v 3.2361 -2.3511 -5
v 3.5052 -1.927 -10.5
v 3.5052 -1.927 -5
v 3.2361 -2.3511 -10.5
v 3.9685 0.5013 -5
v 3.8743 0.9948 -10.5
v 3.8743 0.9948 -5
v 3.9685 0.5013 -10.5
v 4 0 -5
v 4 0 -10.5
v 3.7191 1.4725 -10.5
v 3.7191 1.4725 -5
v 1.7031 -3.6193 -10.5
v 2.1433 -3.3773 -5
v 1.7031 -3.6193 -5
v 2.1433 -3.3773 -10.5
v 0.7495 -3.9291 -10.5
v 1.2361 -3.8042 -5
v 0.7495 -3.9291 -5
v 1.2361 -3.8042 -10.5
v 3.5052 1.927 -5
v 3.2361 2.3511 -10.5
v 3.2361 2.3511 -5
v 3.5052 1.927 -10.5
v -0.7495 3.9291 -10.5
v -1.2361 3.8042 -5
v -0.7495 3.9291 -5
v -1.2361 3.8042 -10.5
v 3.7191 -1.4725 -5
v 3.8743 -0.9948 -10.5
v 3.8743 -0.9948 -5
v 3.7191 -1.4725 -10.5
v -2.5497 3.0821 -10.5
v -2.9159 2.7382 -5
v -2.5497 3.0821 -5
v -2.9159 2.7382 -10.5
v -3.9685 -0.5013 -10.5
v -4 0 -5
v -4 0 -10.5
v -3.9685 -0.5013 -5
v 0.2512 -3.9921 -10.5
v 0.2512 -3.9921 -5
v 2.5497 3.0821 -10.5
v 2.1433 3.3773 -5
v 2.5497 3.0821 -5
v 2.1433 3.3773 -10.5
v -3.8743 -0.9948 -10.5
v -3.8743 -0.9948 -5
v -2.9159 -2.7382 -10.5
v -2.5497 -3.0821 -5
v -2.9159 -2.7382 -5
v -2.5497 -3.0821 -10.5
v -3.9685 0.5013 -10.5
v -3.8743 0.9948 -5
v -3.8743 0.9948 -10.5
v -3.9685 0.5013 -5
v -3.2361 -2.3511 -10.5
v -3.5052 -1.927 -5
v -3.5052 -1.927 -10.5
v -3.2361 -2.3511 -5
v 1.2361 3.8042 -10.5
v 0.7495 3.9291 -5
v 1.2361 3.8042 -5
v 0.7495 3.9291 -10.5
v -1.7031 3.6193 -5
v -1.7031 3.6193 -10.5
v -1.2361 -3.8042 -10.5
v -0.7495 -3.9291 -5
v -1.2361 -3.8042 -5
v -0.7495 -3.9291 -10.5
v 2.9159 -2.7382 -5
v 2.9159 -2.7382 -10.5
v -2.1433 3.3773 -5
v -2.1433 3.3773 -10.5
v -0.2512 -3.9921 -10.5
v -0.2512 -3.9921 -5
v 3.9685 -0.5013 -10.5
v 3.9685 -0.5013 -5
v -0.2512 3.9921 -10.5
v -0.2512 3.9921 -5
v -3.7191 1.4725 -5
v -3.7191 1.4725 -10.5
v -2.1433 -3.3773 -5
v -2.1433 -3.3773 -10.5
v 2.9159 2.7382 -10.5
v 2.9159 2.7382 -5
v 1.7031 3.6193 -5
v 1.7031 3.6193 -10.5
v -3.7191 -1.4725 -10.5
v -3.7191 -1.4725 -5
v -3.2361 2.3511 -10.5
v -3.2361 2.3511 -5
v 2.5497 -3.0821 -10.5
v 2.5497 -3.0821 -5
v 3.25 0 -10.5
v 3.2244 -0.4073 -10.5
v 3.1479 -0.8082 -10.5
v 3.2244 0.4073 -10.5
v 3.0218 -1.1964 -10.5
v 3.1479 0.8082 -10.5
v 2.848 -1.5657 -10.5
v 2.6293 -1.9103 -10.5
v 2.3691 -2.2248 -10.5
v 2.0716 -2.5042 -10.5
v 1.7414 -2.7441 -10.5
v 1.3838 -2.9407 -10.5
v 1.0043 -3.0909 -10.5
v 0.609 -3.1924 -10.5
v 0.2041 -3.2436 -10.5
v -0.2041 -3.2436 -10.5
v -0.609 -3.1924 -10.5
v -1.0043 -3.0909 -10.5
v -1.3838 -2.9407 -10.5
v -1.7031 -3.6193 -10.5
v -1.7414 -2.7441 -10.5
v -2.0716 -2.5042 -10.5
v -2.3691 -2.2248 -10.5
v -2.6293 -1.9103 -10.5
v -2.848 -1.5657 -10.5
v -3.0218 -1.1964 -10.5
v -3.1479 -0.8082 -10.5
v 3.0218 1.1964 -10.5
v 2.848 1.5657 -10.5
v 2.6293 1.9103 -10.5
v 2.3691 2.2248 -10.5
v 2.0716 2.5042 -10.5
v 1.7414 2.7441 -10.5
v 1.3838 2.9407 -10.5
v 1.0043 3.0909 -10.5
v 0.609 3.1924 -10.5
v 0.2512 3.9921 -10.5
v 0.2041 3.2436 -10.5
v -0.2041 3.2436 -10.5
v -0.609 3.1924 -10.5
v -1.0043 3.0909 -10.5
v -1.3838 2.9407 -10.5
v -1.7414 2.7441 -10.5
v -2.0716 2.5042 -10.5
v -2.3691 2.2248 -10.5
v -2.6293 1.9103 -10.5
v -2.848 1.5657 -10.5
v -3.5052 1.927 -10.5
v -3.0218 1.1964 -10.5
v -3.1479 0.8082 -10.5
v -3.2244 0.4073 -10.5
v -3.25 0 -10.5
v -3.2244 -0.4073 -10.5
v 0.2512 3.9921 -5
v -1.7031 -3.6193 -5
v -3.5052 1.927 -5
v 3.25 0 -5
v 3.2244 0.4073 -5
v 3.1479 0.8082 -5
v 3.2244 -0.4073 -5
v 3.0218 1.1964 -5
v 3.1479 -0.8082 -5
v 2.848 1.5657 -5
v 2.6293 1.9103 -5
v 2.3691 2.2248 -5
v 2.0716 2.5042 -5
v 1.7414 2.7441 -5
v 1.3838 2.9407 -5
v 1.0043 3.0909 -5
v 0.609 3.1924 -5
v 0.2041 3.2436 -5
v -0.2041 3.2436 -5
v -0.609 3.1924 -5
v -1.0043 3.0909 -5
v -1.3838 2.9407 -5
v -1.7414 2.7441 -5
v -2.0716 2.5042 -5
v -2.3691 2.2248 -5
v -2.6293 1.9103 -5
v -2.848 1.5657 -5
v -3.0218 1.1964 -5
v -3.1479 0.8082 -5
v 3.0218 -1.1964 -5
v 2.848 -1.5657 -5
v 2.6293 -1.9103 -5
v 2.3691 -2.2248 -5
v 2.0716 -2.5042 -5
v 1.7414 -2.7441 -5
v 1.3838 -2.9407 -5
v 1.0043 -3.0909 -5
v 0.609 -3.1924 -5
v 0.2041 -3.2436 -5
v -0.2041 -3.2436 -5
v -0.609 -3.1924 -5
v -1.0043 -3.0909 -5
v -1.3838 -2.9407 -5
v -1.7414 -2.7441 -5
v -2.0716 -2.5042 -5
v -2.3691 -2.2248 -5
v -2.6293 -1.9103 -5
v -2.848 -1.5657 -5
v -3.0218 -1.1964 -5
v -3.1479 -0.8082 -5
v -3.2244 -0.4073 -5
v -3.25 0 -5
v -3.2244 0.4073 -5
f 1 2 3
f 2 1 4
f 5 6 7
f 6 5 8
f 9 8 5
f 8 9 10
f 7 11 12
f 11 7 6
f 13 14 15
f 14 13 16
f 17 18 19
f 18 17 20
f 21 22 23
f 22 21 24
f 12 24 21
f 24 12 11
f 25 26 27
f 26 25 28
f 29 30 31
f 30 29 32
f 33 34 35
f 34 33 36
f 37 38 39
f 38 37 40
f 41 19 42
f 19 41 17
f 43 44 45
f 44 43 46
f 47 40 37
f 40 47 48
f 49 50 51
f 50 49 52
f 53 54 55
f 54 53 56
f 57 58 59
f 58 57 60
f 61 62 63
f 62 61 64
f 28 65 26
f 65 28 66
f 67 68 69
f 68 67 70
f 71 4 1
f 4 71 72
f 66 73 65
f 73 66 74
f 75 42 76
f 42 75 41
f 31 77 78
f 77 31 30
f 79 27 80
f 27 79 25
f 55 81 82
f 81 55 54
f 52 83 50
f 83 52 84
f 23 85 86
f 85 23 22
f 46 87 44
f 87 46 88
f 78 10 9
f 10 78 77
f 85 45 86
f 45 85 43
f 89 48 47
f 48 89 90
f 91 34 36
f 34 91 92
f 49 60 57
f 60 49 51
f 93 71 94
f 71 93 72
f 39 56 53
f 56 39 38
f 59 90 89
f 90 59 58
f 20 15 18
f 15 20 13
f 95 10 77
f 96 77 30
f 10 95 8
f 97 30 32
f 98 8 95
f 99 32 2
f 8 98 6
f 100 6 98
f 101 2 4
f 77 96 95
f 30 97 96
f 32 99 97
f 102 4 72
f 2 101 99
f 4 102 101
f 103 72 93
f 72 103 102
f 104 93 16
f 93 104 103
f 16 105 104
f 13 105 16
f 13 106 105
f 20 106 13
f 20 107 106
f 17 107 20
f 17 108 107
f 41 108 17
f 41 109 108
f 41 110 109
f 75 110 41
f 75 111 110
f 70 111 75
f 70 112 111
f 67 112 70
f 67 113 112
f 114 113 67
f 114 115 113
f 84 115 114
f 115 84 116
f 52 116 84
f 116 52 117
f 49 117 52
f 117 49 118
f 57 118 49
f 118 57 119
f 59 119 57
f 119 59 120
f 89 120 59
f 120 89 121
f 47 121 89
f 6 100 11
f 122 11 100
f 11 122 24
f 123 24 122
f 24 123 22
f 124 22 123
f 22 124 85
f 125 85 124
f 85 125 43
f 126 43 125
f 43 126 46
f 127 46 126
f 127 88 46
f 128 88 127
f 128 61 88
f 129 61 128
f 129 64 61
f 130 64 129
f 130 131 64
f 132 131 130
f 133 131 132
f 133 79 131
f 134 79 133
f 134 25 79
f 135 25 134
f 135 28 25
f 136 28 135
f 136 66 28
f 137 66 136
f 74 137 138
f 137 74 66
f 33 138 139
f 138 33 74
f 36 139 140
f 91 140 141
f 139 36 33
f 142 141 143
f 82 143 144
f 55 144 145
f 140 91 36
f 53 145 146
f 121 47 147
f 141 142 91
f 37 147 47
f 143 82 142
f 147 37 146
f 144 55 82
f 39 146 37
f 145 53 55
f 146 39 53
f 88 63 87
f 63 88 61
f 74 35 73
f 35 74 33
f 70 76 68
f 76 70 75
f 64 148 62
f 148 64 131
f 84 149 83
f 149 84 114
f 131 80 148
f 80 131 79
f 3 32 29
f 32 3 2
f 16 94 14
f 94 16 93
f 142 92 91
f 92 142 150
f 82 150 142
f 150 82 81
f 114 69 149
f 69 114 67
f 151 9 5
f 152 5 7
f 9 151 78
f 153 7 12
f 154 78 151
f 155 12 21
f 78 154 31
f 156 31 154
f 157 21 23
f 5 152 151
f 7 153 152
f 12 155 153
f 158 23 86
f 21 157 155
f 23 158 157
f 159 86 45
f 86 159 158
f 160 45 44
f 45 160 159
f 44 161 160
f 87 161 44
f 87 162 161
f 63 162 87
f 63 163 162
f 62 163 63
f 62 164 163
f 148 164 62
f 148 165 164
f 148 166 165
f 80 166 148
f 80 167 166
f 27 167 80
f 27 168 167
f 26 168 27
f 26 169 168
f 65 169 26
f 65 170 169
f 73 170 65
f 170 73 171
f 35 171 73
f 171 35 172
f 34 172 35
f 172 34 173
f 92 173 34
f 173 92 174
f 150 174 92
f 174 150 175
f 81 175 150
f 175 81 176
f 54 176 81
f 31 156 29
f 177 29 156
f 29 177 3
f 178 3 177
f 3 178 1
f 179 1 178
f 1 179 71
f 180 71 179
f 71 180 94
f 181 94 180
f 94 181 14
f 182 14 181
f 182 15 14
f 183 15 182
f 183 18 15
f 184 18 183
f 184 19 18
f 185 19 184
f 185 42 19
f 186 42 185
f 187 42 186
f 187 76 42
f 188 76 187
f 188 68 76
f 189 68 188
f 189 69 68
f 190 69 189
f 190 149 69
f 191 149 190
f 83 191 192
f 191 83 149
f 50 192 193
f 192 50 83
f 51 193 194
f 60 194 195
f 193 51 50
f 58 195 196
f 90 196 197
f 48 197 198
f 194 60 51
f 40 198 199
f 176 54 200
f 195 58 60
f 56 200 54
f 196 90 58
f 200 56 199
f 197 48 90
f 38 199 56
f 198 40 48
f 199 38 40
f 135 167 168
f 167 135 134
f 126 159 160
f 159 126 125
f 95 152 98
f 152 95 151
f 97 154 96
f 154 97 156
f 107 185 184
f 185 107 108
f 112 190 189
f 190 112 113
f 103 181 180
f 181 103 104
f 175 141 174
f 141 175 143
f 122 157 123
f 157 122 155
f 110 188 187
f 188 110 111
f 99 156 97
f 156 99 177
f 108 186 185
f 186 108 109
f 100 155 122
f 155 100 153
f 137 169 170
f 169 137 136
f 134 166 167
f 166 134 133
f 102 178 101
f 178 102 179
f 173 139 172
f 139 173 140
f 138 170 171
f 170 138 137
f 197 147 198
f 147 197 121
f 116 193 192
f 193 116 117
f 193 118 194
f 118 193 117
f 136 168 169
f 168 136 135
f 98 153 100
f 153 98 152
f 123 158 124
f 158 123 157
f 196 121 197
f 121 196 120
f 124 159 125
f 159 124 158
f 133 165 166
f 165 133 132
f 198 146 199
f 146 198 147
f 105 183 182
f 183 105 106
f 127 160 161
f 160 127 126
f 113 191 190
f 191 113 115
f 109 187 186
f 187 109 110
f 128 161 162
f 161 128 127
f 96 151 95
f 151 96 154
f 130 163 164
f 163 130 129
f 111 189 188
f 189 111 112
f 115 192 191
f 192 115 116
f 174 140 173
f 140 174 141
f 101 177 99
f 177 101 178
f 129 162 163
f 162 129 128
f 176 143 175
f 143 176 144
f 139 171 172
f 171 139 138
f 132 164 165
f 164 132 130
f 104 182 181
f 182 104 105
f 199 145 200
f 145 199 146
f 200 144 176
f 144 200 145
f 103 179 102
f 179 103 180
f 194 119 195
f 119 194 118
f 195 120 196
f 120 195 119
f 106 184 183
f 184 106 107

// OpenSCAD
$fn = 50;

difference() {
	union() {
		translate(v = [0, 0, -10.5]) {
			cylinder(h = 10.5, r = 4.0);
		}
		#translate(v = [0, 0, -12.0]) {
			cylinder(h = 12, r = 2.875);
		}
	}
	union() {
		translate(v = [0, 0, 0]) {
			rotate(a = [0, 0, 0]) {
				difference() {
					union() {
						translate(v = [0, 0, -5]) {
							linear_extrude(height = 5) {
								polygon(points = [[5.914249999999999, 0.0], [2.957125, 5.1218907443321156], [-2.9571249999999982, 5.1218907443321156], [-5.914249999999999, 7.242867331857232e-16], [-2.9571250000000022, -5.121890744332115], [2.9571249999999956, -5.121890744332118]]);
							}
						}
					}
					union();
				}
			}
		}
		#translate(v = [0, 0, -100.0]) {
			cylinder(h = 200, r = 3.25);
		}
	}
}
